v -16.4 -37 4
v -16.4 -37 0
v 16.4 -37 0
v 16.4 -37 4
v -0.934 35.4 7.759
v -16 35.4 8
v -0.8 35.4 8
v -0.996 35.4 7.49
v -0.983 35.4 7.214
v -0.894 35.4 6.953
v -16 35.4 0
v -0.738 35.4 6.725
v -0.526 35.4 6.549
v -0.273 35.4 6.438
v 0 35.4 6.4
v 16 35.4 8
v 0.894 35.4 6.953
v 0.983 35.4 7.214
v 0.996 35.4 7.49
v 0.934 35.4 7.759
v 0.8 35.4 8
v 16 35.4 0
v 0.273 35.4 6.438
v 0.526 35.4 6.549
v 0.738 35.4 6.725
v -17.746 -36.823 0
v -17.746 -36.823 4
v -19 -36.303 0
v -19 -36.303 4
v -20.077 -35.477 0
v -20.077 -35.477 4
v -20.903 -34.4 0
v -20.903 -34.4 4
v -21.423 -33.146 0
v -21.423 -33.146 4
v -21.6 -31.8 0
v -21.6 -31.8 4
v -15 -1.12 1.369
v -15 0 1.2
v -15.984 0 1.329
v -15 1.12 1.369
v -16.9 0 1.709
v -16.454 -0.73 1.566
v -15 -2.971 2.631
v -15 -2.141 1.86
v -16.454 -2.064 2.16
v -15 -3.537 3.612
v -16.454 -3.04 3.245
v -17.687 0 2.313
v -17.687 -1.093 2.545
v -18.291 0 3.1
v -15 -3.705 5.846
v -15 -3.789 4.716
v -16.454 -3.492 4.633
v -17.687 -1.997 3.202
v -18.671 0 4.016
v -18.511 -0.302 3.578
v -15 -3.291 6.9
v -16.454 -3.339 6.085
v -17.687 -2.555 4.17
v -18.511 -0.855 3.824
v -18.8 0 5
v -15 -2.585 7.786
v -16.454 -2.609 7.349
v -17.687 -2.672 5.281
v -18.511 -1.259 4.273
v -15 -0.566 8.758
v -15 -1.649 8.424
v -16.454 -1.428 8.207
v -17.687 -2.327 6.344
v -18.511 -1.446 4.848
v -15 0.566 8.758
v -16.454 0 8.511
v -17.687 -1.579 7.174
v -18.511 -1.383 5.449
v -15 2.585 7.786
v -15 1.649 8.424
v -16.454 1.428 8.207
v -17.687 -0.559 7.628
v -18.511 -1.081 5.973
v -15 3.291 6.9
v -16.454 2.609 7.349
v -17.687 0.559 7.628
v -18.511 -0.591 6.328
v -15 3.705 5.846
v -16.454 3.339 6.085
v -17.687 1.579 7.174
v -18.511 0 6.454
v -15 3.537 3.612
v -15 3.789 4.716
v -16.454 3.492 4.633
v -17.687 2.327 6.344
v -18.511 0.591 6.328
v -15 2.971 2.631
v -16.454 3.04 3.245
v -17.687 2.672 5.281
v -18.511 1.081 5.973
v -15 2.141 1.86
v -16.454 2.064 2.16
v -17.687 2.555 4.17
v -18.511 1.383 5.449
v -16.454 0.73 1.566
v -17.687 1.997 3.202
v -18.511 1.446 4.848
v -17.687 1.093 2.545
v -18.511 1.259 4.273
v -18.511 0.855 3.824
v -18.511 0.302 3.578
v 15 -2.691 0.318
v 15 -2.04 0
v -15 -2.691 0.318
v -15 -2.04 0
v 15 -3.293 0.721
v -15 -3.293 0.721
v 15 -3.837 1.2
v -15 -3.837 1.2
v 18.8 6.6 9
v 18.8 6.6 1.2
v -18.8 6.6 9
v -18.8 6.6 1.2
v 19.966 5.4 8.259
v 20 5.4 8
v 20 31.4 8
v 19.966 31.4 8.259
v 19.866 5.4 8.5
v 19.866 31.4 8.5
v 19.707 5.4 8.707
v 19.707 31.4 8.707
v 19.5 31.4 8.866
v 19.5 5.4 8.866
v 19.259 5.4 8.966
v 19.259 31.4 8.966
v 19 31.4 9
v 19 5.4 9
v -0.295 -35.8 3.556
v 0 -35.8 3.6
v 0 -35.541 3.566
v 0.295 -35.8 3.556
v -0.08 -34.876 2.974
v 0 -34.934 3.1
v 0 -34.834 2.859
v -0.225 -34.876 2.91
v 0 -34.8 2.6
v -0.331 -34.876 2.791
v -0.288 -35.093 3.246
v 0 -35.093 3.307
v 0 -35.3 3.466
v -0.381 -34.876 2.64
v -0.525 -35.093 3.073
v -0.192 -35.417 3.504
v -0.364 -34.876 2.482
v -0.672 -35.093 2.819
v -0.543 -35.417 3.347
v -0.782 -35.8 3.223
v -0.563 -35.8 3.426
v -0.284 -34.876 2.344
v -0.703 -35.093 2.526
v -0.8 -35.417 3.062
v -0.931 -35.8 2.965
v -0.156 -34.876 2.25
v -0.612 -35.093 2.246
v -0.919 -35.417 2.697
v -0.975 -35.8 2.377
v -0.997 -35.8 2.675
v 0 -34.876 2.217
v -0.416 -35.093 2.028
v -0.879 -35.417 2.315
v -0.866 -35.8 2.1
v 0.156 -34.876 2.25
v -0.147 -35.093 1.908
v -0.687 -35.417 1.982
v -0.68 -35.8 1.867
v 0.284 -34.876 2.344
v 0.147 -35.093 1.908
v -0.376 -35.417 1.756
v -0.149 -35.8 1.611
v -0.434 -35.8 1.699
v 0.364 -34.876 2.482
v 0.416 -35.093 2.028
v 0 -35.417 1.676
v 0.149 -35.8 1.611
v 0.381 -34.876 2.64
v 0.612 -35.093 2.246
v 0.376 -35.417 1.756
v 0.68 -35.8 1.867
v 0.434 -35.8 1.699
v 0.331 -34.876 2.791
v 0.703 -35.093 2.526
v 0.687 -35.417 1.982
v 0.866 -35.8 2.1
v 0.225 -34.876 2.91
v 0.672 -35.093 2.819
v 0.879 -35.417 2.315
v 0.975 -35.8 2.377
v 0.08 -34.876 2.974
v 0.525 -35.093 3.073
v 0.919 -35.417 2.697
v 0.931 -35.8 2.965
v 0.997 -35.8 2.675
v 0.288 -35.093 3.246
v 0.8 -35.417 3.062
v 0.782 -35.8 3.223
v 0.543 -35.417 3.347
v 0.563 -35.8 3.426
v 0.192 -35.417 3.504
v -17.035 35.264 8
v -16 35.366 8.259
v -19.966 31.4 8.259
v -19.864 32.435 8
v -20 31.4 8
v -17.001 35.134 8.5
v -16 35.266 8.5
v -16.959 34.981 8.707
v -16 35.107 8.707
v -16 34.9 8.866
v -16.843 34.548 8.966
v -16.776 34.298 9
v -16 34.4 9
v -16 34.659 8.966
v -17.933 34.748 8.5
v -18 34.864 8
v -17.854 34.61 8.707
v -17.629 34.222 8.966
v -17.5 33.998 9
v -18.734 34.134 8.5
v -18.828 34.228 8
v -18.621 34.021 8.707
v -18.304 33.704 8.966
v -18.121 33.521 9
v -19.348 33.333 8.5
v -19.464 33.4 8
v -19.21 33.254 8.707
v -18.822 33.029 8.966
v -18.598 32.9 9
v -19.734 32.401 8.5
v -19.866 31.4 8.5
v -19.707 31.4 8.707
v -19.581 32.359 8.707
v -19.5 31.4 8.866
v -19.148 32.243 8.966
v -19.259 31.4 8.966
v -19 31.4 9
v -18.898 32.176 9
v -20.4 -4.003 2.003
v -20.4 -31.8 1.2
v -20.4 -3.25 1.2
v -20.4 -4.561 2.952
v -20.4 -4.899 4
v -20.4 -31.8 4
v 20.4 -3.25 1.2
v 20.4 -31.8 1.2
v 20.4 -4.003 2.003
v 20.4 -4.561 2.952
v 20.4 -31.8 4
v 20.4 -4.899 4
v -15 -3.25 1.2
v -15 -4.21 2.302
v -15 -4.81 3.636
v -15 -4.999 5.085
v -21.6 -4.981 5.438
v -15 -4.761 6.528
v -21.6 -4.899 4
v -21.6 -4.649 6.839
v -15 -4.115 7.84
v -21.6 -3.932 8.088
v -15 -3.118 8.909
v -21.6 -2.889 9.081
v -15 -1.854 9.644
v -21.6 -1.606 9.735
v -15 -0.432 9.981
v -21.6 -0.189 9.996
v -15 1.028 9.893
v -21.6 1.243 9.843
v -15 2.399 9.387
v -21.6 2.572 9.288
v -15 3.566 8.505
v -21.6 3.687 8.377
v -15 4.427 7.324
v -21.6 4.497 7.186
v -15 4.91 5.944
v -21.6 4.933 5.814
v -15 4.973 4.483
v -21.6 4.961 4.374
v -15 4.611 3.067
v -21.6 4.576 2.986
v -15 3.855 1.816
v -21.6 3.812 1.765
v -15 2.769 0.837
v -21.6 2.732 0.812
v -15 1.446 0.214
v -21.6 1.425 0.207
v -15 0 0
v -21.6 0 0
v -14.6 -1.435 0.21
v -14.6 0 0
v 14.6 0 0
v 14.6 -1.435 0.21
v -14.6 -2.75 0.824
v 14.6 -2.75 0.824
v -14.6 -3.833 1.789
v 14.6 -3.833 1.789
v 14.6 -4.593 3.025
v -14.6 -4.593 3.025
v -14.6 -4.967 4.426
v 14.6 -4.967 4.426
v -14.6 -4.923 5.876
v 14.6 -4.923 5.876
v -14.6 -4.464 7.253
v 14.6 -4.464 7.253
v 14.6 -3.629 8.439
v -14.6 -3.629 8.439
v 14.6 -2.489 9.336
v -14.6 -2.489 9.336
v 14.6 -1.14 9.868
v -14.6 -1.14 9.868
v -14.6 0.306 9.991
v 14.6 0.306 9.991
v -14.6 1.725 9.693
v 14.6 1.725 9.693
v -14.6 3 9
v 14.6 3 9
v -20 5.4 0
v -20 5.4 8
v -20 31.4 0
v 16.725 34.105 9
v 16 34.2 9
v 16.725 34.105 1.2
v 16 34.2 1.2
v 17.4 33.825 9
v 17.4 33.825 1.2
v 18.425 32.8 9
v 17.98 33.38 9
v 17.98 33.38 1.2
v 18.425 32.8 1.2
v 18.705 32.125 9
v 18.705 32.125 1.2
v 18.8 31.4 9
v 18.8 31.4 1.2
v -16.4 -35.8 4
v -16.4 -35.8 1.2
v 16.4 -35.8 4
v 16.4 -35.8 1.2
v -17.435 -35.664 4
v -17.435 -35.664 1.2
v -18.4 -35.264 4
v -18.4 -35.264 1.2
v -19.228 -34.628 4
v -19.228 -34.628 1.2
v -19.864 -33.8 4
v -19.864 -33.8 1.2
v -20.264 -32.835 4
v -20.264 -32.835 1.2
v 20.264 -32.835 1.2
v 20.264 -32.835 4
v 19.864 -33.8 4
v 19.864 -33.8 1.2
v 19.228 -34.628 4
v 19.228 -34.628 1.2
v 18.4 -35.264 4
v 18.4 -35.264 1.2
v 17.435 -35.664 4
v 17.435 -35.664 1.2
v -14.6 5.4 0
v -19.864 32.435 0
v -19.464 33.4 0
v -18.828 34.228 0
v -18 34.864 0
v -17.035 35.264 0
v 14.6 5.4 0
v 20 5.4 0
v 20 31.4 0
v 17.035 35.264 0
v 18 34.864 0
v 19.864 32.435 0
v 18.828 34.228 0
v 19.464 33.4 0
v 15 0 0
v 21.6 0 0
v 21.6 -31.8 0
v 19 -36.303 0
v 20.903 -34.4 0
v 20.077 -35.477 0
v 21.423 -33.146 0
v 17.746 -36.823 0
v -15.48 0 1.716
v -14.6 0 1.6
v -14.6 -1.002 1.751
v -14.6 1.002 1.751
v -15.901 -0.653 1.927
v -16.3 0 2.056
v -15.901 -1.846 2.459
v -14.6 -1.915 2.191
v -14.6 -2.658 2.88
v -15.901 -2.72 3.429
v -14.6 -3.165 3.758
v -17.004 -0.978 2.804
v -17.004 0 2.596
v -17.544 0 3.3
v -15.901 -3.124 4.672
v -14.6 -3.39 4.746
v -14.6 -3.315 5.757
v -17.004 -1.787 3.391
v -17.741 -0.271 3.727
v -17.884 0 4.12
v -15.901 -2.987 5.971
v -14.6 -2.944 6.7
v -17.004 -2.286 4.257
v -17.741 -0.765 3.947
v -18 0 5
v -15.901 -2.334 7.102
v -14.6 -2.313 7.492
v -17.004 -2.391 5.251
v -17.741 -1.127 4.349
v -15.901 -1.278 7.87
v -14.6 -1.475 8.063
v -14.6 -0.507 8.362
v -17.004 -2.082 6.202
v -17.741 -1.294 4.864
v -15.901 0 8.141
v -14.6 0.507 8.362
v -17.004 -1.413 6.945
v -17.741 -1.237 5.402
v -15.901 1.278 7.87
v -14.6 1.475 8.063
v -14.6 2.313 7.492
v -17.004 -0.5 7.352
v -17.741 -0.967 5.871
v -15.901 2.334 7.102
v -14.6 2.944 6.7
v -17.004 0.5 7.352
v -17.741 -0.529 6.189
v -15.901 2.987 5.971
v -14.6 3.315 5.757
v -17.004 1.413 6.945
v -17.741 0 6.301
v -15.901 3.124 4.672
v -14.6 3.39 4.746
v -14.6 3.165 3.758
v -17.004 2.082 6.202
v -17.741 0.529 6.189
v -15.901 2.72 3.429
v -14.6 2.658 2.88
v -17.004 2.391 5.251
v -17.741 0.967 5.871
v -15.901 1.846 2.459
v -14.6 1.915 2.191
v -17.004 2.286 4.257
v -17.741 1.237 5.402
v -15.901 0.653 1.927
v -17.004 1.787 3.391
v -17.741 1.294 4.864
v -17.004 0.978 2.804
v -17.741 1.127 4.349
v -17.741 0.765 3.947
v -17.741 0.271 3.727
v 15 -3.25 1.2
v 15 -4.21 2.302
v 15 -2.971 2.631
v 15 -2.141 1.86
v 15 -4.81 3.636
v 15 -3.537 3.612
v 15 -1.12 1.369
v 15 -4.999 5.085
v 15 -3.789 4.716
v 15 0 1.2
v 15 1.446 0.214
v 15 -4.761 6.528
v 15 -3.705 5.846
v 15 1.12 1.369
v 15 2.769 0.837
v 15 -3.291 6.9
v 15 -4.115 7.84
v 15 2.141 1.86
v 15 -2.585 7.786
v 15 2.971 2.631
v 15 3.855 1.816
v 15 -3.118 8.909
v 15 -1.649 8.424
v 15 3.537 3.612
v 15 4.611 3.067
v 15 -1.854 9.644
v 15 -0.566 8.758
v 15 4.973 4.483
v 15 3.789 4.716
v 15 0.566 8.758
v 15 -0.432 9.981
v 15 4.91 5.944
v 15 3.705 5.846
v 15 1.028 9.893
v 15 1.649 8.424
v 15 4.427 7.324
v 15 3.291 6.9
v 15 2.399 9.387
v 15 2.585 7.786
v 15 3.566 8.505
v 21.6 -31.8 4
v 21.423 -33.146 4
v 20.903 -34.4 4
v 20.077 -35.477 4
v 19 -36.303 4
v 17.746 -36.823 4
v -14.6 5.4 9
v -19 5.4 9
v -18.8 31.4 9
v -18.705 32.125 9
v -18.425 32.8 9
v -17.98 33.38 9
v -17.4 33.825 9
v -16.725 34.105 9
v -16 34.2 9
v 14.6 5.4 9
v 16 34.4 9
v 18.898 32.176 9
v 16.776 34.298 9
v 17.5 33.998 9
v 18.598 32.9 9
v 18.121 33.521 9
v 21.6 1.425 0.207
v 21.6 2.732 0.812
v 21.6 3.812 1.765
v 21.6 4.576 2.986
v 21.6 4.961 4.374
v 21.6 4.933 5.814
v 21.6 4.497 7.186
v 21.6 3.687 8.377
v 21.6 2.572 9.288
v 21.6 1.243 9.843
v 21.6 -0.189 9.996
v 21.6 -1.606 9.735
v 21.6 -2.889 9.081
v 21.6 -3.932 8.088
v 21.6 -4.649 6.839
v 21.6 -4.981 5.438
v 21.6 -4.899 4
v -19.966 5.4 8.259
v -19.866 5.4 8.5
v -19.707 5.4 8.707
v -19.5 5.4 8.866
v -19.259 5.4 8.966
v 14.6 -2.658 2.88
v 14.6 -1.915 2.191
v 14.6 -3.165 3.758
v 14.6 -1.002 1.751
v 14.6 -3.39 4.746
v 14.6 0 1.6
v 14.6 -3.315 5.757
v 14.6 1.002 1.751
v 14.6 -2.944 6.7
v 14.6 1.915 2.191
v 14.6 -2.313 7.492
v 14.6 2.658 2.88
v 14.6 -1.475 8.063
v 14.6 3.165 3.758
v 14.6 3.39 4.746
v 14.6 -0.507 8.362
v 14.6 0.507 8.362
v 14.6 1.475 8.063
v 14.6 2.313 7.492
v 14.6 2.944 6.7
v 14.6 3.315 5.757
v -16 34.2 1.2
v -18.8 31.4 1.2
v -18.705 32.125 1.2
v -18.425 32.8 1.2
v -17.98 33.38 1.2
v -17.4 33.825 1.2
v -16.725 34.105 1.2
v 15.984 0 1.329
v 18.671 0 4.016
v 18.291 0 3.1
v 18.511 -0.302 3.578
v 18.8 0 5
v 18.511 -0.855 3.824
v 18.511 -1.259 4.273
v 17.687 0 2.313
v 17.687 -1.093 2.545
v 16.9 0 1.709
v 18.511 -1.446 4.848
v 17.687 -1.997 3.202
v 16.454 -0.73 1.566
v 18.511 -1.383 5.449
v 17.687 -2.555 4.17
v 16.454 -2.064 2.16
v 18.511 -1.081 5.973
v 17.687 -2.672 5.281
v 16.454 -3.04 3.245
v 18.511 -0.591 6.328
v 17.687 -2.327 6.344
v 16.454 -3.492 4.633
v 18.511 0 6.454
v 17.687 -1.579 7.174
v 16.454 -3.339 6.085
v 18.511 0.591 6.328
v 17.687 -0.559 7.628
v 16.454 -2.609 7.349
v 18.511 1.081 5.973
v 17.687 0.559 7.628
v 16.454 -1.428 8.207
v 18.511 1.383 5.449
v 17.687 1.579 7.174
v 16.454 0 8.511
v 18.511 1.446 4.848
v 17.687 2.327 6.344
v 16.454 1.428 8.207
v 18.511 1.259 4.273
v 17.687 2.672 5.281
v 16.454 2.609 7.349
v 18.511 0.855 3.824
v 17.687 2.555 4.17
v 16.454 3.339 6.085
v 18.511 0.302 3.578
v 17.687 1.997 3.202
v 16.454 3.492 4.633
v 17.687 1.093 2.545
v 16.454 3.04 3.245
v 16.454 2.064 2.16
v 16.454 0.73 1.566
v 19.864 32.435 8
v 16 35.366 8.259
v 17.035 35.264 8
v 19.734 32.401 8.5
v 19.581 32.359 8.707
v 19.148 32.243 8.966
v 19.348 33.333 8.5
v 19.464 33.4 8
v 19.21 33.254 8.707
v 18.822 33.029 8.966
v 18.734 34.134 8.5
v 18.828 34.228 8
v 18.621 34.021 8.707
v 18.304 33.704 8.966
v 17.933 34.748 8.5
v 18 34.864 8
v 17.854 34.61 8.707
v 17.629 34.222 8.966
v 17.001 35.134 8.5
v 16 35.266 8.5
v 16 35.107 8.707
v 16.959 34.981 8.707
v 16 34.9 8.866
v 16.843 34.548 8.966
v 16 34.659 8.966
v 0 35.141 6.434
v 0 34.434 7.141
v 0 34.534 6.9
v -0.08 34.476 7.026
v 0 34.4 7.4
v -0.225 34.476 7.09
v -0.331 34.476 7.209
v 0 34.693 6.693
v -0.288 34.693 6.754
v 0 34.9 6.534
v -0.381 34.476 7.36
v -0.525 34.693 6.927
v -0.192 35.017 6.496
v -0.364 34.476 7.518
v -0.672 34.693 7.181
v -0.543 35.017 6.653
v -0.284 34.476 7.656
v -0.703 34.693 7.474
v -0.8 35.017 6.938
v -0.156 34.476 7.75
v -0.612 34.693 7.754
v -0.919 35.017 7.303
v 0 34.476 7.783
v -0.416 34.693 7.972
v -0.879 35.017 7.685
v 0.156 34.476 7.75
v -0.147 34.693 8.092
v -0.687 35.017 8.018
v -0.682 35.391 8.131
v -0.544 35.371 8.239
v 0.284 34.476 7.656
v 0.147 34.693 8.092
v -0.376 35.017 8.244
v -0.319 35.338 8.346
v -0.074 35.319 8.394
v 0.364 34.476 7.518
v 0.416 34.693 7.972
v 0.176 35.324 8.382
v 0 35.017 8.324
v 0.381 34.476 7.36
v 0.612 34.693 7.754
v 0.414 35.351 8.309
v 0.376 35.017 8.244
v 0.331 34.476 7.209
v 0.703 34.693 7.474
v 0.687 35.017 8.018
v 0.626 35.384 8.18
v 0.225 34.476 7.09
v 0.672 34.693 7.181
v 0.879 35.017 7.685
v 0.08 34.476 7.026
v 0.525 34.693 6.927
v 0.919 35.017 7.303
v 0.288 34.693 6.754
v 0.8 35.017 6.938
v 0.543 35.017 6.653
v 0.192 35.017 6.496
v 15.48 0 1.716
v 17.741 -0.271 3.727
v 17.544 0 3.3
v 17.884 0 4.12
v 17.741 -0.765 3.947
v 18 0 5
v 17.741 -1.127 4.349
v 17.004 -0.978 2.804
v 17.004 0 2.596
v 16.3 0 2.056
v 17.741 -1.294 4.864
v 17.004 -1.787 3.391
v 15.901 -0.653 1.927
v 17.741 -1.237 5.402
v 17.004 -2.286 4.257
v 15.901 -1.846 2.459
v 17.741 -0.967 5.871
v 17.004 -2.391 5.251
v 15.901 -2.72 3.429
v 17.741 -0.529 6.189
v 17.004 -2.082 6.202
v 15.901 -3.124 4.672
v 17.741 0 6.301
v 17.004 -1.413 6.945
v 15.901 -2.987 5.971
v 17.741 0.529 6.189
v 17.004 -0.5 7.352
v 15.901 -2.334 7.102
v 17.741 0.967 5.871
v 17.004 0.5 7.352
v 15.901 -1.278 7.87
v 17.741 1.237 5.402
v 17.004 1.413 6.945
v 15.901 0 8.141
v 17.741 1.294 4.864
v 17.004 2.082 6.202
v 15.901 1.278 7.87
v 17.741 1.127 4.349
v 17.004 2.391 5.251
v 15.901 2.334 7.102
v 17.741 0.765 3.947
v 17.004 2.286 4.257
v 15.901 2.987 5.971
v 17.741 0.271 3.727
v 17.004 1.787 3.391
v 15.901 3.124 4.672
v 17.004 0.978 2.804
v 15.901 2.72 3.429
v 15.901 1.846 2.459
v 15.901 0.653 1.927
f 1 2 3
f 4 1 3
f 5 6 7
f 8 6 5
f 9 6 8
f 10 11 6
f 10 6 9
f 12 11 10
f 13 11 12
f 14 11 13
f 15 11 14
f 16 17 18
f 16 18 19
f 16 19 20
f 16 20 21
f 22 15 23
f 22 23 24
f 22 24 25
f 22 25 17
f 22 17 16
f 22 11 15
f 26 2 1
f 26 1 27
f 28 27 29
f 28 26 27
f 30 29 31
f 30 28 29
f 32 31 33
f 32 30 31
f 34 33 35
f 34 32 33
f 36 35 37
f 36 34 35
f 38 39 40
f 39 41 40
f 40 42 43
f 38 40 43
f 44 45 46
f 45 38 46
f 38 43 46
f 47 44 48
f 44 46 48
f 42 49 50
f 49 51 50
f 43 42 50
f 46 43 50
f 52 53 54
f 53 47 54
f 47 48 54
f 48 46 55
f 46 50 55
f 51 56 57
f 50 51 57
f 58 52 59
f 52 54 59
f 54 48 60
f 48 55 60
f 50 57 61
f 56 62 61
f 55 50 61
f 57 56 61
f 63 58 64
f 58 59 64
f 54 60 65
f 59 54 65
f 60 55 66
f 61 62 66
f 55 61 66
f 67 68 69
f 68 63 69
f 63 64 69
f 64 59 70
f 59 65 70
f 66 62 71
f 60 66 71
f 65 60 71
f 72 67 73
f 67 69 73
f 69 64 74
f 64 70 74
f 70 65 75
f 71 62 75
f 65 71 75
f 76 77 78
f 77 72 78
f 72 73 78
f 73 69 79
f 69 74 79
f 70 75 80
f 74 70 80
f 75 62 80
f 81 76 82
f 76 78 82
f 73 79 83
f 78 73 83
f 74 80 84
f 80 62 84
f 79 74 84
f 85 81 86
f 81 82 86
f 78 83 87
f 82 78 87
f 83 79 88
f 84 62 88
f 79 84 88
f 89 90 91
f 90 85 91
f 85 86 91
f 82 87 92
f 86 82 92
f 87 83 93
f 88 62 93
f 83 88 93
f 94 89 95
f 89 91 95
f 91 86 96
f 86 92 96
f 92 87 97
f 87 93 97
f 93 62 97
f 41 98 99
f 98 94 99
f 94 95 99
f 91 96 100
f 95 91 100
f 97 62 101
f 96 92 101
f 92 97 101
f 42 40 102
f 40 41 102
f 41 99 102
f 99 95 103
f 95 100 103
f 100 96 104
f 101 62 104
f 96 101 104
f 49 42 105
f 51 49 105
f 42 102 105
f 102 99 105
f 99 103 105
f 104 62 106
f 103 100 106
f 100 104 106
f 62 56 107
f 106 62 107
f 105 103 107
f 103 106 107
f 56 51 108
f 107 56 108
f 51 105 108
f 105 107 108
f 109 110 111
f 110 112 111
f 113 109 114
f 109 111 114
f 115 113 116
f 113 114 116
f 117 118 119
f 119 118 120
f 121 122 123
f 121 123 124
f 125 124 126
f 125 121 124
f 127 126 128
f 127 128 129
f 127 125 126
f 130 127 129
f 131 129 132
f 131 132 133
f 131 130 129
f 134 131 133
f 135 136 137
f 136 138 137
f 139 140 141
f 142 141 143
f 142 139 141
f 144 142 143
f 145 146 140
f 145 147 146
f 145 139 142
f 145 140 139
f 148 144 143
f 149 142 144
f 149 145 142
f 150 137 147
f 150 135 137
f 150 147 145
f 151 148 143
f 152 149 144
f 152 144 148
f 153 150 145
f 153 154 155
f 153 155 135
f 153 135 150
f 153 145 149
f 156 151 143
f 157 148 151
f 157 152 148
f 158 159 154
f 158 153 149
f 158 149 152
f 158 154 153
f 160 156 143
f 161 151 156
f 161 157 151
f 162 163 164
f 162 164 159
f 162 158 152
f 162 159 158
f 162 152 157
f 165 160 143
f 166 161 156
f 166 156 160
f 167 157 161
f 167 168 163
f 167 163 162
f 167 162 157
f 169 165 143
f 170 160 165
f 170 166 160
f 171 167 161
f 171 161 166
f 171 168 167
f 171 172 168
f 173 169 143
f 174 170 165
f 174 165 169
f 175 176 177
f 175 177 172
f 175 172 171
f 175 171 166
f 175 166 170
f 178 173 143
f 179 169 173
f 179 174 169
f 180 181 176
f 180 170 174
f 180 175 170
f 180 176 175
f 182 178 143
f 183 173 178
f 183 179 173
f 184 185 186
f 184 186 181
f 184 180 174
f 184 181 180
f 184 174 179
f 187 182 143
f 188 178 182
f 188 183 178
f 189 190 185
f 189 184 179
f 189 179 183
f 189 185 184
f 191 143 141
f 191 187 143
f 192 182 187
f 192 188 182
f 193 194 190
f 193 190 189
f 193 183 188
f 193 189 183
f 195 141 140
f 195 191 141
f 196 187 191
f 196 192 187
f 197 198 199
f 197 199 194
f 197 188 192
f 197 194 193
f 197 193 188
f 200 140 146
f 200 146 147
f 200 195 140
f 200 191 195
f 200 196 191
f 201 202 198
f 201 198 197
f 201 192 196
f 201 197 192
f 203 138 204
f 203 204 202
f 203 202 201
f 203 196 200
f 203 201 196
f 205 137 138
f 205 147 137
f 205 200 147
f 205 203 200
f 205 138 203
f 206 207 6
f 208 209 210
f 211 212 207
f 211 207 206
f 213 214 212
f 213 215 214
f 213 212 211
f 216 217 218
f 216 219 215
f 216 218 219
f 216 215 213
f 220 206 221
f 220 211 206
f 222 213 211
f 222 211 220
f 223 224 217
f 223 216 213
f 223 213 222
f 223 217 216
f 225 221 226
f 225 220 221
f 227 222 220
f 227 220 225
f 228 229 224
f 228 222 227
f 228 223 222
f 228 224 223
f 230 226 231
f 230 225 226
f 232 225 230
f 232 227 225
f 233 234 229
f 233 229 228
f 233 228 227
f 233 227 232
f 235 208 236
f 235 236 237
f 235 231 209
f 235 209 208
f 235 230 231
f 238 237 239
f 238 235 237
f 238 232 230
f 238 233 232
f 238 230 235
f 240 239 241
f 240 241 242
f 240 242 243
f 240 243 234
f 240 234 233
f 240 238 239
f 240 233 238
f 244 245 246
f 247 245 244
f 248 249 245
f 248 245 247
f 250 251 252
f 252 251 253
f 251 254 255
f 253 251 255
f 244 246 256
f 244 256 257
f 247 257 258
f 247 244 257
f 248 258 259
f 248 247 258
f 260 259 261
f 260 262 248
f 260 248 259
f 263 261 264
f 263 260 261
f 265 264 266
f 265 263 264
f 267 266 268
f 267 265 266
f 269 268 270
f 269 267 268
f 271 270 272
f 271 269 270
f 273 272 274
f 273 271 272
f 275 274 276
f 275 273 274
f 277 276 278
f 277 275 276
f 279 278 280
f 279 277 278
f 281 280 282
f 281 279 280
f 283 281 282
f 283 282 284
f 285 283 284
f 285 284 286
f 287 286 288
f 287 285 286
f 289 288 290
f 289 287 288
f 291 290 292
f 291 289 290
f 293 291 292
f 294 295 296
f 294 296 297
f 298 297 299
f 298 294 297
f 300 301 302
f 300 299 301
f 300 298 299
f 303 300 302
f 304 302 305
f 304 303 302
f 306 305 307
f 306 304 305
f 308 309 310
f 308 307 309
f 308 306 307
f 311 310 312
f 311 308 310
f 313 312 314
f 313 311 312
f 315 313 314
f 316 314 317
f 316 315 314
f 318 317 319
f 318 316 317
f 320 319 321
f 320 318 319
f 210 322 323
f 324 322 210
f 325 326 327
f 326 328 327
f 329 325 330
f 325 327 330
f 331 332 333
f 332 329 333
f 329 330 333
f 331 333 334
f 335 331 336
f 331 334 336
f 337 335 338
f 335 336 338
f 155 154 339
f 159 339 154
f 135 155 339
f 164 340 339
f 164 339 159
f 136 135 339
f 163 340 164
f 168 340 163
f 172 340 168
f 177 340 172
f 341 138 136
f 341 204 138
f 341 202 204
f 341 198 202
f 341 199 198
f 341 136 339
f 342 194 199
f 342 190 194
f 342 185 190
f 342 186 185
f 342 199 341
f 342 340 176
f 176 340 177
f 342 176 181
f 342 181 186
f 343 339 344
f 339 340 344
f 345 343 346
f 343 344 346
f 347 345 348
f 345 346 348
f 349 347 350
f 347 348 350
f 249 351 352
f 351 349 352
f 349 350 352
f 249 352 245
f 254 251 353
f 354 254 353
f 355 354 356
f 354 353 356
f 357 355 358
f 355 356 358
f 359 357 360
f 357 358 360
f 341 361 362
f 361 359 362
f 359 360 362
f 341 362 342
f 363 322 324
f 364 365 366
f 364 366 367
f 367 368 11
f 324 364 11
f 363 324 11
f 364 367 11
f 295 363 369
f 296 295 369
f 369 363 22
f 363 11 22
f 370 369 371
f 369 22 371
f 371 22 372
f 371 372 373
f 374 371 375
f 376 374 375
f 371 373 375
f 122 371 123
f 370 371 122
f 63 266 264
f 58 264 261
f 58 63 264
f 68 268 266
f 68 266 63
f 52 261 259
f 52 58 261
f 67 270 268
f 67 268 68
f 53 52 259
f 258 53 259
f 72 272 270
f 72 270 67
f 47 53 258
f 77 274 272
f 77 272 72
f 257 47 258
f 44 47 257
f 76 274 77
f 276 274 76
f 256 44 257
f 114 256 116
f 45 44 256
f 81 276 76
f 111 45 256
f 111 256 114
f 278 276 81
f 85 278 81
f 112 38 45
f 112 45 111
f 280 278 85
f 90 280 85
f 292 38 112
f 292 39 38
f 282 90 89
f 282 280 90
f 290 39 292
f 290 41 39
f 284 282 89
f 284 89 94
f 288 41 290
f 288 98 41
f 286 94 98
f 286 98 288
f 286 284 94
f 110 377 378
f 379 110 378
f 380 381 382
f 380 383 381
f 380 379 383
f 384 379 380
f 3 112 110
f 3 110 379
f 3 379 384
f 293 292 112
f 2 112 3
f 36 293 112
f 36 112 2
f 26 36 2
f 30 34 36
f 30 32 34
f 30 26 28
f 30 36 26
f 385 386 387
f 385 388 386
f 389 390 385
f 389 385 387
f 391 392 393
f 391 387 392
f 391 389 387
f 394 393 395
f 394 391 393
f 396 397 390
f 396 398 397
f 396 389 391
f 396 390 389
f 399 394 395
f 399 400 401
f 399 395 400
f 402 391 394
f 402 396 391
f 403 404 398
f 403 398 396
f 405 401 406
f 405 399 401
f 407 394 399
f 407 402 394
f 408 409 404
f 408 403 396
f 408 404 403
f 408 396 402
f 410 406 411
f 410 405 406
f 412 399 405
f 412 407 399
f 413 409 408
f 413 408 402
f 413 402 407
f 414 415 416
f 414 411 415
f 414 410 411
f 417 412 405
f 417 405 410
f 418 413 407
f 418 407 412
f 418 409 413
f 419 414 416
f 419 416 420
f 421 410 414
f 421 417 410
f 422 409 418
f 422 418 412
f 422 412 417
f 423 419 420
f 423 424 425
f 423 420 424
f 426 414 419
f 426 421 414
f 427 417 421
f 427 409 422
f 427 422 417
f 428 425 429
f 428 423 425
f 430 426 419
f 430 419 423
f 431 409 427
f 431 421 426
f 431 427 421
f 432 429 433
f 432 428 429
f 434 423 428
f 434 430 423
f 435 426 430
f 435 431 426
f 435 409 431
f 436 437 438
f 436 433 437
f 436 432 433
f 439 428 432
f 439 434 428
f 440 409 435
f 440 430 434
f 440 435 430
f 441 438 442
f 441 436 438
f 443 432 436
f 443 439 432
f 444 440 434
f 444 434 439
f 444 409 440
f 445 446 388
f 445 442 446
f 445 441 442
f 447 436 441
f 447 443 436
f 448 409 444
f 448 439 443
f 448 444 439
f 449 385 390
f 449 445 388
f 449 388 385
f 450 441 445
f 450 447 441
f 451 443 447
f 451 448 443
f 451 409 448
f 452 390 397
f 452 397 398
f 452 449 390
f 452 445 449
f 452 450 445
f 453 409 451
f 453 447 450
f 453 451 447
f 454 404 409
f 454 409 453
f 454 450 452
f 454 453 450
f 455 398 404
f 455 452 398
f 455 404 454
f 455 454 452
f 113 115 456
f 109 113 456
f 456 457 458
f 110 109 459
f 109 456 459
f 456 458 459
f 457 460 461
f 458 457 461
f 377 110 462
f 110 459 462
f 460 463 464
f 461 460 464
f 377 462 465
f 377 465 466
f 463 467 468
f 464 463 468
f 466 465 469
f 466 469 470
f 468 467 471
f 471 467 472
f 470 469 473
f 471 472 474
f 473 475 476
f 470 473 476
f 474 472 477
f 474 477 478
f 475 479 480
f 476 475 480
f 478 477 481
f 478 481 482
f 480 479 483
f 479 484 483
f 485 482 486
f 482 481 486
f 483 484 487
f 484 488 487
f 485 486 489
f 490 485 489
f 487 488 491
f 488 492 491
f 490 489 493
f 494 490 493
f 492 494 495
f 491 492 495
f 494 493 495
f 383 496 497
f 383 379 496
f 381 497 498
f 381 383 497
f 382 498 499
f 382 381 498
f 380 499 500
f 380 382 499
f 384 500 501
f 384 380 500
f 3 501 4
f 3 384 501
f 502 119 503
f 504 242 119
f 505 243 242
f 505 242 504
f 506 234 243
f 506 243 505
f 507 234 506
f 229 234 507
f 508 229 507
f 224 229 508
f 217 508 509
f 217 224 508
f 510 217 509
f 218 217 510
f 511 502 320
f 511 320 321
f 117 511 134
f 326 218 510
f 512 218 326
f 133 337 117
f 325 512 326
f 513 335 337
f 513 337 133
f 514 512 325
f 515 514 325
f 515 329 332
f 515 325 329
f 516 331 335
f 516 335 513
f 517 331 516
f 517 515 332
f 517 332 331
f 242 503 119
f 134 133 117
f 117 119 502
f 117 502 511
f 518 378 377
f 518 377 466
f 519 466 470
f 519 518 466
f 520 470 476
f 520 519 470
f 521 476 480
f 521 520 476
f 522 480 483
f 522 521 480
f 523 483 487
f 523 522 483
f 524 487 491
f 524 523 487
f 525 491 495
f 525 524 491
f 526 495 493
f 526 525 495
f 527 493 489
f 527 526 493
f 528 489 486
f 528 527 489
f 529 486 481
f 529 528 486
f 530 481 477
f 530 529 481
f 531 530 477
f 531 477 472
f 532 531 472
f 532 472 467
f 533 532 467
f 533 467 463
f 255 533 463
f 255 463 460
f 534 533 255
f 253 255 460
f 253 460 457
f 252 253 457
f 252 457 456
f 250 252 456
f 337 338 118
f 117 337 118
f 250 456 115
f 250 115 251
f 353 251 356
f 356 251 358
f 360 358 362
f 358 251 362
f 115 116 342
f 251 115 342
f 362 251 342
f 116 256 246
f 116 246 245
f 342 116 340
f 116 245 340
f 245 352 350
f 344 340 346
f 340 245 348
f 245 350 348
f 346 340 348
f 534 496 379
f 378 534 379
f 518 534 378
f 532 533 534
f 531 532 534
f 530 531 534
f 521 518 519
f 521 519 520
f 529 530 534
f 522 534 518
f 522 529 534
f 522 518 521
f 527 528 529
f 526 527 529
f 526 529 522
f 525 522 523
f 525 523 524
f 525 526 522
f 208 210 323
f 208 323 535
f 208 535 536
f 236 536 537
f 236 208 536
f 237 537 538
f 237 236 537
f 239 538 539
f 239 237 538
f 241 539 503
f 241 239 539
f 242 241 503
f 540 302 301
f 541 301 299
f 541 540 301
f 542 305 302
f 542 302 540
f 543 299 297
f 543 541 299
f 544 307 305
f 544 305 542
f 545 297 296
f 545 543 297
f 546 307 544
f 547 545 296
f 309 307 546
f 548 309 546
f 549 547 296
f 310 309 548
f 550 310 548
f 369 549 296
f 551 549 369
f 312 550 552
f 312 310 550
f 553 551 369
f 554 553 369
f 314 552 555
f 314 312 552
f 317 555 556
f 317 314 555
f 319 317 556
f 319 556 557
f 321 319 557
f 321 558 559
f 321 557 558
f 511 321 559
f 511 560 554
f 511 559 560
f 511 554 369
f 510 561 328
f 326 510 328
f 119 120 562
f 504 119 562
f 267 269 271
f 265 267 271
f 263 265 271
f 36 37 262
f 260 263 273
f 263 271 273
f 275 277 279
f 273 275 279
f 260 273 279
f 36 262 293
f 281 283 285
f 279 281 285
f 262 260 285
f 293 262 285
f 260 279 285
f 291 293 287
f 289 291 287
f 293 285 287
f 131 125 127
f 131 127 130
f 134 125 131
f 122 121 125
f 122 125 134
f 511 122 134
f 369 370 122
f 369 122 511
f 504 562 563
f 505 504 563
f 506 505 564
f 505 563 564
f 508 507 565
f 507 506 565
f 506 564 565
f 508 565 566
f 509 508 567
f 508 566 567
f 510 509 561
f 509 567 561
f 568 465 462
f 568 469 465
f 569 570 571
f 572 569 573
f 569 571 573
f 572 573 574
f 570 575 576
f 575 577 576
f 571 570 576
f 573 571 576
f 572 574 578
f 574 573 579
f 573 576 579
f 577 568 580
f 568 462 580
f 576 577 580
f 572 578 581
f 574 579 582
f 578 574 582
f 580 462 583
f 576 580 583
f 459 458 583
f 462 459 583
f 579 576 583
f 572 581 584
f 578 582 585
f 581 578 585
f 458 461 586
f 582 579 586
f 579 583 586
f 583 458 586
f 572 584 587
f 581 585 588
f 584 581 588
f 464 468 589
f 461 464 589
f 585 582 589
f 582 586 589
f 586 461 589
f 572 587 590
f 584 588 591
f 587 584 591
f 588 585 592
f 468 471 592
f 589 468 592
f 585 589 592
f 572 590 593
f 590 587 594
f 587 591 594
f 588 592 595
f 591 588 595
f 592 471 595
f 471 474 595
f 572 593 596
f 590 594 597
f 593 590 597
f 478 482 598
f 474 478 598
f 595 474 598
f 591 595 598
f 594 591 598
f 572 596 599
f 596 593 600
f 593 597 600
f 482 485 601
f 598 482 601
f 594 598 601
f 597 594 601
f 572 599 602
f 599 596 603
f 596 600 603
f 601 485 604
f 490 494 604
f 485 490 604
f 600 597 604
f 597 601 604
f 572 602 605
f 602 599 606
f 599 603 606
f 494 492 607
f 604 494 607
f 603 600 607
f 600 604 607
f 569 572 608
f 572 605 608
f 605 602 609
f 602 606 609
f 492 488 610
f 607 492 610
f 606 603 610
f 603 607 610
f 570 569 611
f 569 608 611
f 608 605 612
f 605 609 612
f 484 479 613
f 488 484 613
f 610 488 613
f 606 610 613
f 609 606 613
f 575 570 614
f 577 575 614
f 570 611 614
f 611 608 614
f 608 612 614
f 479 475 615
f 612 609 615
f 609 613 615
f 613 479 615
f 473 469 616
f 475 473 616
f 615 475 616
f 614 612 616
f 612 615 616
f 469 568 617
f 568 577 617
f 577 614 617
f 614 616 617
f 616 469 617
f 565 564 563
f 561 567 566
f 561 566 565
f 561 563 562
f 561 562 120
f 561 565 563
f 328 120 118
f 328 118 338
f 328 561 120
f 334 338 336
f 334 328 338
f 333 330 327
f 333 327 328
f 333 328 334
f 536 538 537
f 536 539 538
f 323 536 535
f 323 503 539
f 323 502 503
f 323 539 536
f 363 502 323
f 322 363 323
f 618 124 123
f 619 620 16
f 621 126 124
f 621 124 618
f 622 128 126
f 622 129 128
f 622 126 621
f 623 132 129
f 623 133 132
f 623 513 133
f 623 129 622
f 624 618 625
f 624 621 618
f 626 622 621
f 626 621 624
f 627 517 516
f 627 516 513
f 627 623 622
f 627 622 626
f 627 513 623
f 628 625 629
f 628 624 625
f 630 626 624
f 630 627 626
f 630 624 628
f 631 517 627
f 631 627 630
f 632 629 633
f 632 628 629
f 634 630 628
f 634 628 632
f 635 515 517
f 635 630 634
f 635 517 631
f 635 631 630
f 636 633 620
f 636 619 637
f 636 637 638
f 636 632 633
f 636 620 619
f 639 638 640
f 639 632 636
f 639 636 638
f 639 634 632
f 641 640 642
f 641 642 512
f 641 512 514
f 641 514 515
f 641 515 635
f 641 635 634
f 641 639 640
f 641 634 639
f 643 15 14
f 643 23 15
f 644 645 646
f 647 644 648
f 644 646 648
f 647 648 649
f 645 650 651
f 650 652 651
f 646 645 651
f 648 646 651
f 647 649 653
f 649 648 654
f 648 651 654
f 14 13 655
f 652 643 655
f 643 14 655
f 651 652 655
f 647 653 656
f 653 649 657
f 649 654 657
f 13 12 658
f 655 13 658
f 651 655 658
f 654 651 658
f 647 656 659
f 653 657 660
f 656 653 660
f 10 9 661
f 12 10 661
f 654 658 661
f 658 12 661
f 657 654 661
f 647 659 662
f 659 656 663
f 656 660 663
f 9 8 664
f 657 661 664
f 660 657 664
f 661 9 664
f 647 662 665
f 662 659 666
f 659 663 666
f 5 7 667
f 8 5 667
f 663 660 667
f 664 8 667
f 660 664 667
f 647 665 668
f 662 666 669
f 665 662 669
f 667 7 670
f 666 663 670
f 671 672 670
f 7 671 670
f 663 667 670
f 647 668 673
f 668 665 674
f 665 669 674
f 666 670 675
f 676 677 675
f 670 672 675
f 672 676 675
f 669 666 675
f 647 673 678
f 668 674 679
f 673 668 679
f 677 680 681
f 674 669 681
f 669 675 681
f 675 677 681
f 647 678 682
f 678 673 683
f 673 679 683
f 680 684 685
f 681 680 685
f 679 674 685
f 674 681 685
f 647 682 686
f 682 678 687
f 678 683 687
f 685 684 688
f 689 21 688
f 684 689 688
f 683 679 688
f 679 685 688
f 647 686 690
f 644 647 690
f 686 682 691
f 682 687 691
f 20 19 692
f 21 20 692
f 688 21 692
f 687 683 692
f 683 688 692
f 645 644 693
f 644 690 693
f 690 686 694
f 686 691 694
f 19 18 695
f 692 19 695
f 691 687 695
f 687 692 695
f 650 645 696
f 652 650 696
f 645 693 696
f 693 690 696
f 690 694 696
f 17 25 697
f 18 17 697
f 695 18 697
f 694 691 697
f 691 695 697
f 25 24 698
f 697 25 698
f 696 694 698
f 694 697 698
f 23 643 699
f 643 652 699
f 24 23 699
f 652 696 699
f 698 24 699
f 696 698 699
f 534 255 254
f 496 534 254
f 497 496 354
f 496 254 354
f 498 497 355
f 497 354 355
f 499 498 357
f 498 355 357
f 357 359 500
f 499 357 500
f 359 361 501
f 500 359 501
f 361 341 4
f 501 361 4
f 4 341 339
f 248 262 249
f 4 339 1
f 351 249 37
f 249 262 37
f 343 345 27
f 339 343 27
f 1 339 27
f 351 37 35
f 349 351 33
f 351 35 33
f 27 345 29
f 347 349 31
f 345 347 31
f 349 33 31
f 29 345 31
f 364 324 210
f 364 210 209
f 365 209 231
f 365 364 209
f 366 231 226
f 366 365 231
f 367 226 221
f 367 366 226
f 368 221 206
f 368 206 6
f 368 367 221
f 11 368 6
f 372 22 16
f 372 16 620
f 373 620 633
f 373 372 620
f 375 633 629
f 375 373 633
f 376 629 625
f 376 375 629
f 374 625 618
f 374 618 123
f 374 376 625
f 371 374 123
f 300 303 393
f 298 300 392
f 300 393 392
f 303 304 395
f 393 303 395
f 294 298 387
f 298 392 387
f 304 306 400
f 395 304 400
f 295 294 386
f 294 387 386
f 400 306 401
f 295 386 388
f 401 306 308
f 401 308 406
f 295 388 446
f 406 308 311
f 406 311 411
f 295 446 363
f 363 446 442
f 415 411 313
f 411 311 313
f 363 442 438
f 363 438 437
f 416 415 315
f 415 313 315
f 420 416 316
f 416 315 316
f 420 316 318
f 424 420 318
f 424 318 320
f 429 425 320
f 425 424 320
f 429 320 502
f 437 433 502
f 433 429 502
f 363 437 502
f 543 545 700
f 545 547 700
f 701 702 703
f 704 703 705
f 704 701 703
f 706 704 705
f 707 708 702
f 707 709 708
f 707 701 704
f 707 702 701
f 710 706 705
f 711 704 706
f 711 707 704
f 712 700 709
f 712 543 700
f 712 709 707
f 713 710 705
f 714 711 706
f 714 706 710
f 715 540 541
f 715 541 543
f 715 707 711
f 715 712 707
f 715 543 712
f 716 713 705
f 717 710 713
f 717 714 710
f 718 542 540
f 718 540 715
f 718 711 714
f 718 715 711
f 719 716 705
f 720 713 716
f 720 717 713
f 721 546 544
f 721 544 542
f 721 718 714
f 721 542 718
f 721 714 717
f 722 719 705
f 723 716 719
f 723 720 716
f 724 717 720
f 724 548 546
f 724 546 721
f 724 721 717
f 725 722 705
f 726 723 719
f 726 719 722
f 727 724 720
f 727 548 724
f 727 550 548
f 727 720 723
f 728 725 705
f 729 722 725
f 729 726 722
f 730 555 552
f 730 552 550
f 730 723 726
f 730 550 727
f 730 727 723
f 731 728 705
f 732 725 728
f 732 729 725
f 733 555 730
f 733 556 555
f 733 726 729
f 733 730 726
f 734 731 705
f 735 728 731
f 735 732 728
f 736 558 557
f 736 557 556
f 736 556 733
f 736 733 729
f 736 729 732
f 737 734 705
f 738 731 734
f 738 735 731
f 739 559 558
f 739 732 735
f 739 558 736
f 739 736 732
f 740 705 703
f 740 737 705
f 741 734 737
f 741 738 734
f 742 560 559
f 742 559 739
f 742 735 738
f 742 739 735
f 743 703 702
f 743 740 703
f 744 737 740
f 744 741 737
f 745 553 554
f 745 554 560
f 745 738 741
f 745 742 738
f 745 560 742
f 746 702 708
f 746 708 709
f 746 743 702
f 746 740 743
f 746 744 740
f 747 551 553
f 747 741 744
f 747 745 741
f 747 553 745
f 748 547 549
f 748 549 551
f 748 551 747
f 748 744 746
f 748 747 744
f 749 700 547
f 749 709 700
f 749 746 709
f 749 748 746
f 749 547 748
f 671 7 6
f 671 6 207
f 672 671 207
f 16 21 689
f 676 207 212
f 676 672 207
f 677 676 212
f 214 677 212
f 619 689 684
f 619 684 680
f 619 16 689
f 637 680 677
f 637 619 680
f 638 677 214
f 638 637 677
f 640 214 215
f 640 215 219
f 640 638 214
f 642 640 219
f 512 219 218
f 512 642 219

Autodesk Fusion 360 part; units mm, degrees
sketch "Body" plane through (0, 0, 0) normal (0, 0, 1) x (1, 0, 0) in component "Base"
  line L0 (0, 0) -> (0, 5.4)
  line L1 (0, 5.4) -> (-20, 5.4)
  line L2 (-20, 5.4) -> (-20, 31.4)
  line L3 (-16, 35.4) -> (16, 35.4)
  line L4 (20, 31.4) -> (20, 5.4)
  line L5 (20, 5.4) -> (0, 5.4)
  arc A0 (-16, 35.4) -> (-20, 31.4) centre (-16, 31.4) ccw
  arc A1 (20, 31.4) -> (16, 35.4) centre (16, 31.4) ccw
  line L6 (0, 6.6) -> (-18.8, 6.6)
  line L7 (-18.8, 6.6) -> (-18.8, 31.4)
  arc A2 (-16, 34.2) -> (-18.8, 31.4) centre (-16, 31.4) ccw
  line L8 (-16, 34.2) -> (16, 34.2)
  arc A3 (18.8, 31.4) -> (16, 34.2) centre (16, 31.4) ccw
  line L9 (18.8, 31.4) -> (18.8, 6.6)
  line L10 (18.8, 6.6) -> (0, 6.6)
  dimension "d7" = 5.4
  dimension "d8" = 20
  dimension "d9" = 30
  dimension "d10" = 40
  dimension "d11" = 30
  dimension "d12" = 20
  dimension "d13" = 4
  dimension "d14" = 1.2
extrude "Extrude1" add sketch "Body" along normal blind 1.2 contours L6 L7 A2 L8 A3 L9 L10 makes body 1 in component "Base"
extrude "Extrude2" add sketch "Body" along normal blind 9 bodies 1 in component "Base"
sketch "Hinge" plane through (0, 0, 0) normal (1, 0, 0) x (0, 1, 0) in component "Base"
  line L0 (0, 0) -> (5.4, 0)
  line L1 (0, 0) -> (0, 5)
  circle A0 centre (0, 5) radius 5
  line L2 (0, 9) -> (5.4, 9)
  line L3 (5.4, 9) -> (5.4, 0)
  dimension "d19" = 5
  dimension "d20" = 10
  dimension "d21" = 9
extrude "Extrude3" add sketch "Hinge" along normal mid plane 29.2 bodies 1 in component "Base"
sketch "Hinge Ball" plane through (0, 0, 0) normal (0, 1, 0) x (1, 0, 0) in component "Base"
  line L0 (0, 0) -> (-18.8, 0)
  line L1 (0, 0) -> (0, -5) construction
  line L2 (0, -5) -> (14.6, -5) construction
  line L3 (14.6, -5) -> (18, -5)
  line L4 (14.6, -5) -> (14.6, -1.6)
  line L5 (18, -5) -> (18, -10.5) construction
  line L6 (14.6, -1.6) -> (9.5, -1.6) construction
  arc A0 (18, -5) -> (14.6, -1.6) centre (14.6, -5) ccw
  line L7 (-14.6, -5) -> (-18, -5)
  arc A1 (-14.6, -1.6) -> (-18, -5) centre (-14.6, -5) ccw
  line L8 (-14.6, -5) -> (-14.6, -1.6)
  dimension "d24" = 5
  dimension "d25" = 14.6
  dimension "d26" = 3.4
  dimension "d27" = 3.4
revolve "Revolve1" add sketch "Hinge Ball" angle 360 about axis through (0, 0, 5) along (1, 0, 0) bodies 1 in component "Base"
sketch "Body (2)" plane through (0, 0, 0) normal (0, 0, 1) x (1, 0, 0) in component "Lid"
  line L0 (0, 0) -> (0, 5.4)
  line L1 (0, 0) -> (0, -5)
  line L2 (0, -5) -> (-20.4, -5)
  line L3 (-20.4, -5) -> (-20.4, -31.8)
  line L4 (-16.4, -35.8) -> (16.4, -35.8)
  line L5 (20.4, -31.8) -> (20.4, -5)
  line L6 (20.4, -5) -> (0, -5)
  arc A0 (-20.4, -31.8) -> (-16.4, -35.8) centre (-16.4, -31.8) ccw
  arc A1 (16.4, -35.8) -> (20.4, -31.8) centre (16.4, -31.8) ccw
  line L7 (-21.6, -5) -> (-21.6, -31.8)
  arc A2 (-21.6, -31.8) -> (-16.4, -37) centre (-16.4, -31.8) ccw
  line L8 (-16.4, -37) -> (16.4, -37)
  arc A3 (16.4, -37) -> (21.6, -31.8) centre (16.4, -31.8) ccw
  line L9 (21.6, -31.8) -> (21.6, -5)
  line L10 (-21.6, -5) -> (-20.4, -5)
  line L11 (21.6, -5) -> (20.4, -5)
  dimension "d29" = 5
  dimension "d30" = 20.4
  dimension "d31" = 30.8
  dimension "d32" = 40.8
  dimension "d33" = 30.8
  dimension "d34" = 20.4
  dimension "d35" = 4
  dimension "d36" = 1.2
extrude "Extrude1'" add sketch "Body (2)" along normal blind 1.2 separate body contours L2 L3 L4 L5 L6 A0 A1 makes body 2 in component "Lid"
extrude "Extrude2'" add sketch "Body (2)" along normal blind 4 contours L3 L4 L5 A0 A1 L7 A2 L8 A3 L9 L10 L11 bodies 2 in component "Lid"
sketch "Hing Sockets" plane through (0, 0, 0) normal (0, 1, 0) x (1, 0, 0) in component "Lid"
  line L0 (0, 0) -> (0, -5)
  line L1 (21.6, 0) -> (21.6, -5)
  line L2 (0, -5) -> (15, -5) construction
  line L3 (15, -5) -> (18.8, -5)
  line L4 (15, -5) -> (15, -1.2)
  line L5 (18.8, -5) -> (18.8, -10.0001) construction
  line L6 (15, -1.2) -> (11, -1.2) construction
  arc A0 (18.8, -5) -> (15, -1.2) centre (15, -5) ccw
  line L7 (18.8, -5) -> (21.6, -5)
  line L8 (15, 0) -> (18.8, 0)
  line L9 (18.8, 0) -> (21.6, 0)
  line L10 (15, -1.2) -> (15, 0)
  arc A1 (-15, -1.2) -> (-18.8, -5) centre (-15, -5) ccw
  line L11 (-18.8, -5) -> (-21.6, -5)
  line L12 (-21.6, 0) -> (-21.6, -5)
  line L13 (-18.8, 0) -> (-21.6, 0)
  line L14 (-15, 0) -> (-18.8, 0)
  line L15 (-15, -1.2) -> (-15, 0)
  dimension "d41" = 5
  dimension "d42" = 21.6
  dimension "d43" = 15
  dimension "d44" = 3.8
  dimension "d45" = 3.8
  dimension "d46" = 5
revolve "Revolve1'" add sketch "Hing Sockets" angle 360 about axis through (0, 0, 5) along (1, 0, 0) separate body contours L1 A0 L7 L8 L9 L10 | A1 L11 L12 L13 L14 L15 makes body 3 at (-17.2, -0.2492, 0.0062) makes body 4 at (17.2, -0.2492, 0.0062) in component "Lid"
sketch "Body To Hinge Sockets" plane through (0, 0, 0) normal (1, 0, 0) x (0, 1, 0) in component "Lid"
  line L0 (0, 0) -> (5.4, 0)
  line L1 (0, 0) -> (0, 5)
  line L2 (0, 0) -> (-5, 0)
  line L3 (0, 1.2) -> (-5, 1.2)
  line L4 (0, 4) -> (-5, 4)
  line L5 (-5, 4) -> (-5, 0)
  circle A0 centre (0, 5) radius 5
  circle A1 centre (0, 5) radius 5.4
  dimension "d48" = 5
  dimension "d49" = 5
  dimension "d50" = 1.2
  dimension "d51" = 4
  dimension "d52" = 10
  dimension "d53" = 0.4
extrude "Extrude3'" add sketch "Body To Hinge Sockets" along normal mid plane 43.2 contours L2 L3 A0 A1 | L2 L3 L5 A1 | L3 L4 L5 A0 A1 | L3 L5 A1 bodies 2 3 4 in component "Lid"
extrude "Extrude4" cut sketch "Body To Hinge Sockets" along normal mid plane 30 contours L2 L3 A0 A1 | L3 L4 L5 A0 A1 | L3 L5 A1 bodies 2 in component "Lid"
extrude "Extrude5" cut sketch "Body To Hinge Sockets" along normal mid plane 40.8 contours L3 L4 L5 A0 A1 | L3 L5 A1 bodies 2 in component "Lid"
fillet "Fillet1" radius 1 5 edges at (20, 18.4, 9) (18.8284, 34.2284, 9) (0, 35.4, 9) (-18.8284, 34.2284, 9) (-20, 18.4, 9) on bodies 1 in component "Base"
sketch "Latch Socket" plane through (0, 0, 0) normal (1, 0, 0) x (0, 1, 0) in component "Base"
  line L0 (0, 0) -> (5.4, 0)
  line L1 (0, 0) -> (35.4, 0) construction
  line L2 (35.4, 0) -> (35.4, 7.4) construction
  circle A0 centre (35.4, 7.4) radius 1
  line L3 (35.4, 7.4) -> (35.4, 8.4)
  line L4 (35.4, 7.4) -> (34.4, 7.4)
  dimension "d68" = 35.4
  dimension "d69" = 7.4
  dimension "d70" = 2
revolve "Revolve2" cut sketch "Latch Socket" angle 360 about axis through (0, 35.4, 7.4) along (0, -1, 0) contours A0 L3 L4 picked at (34.9478, 6.9127) bodies 1 in component "Base"
sketch "Latch Ball" plane through (0, 0, 0) normal (1, 0, 0) x (0, 1, 0) in component "Lid"
  line L0 (-35.8, 1.2) -> (-35.8, 2.6)
  circle A0 centre (-35.8, 2.6) radius 1
  line L1 (-35.8, 2.56) -> (-35.8, 3.6)
  line L2 (-35.8, 2.6) -> (-34.8, 2.6)
  point P0 (0, 0)
  dimension "d76" = 1.4
  dimension "d77" = 2
revolve "Revolve2'" add sketch "Latch Ball" angle 360 about axis through (0, -35.8, 2.6) along (0, 1, 0) contours A0 L1 L2 bodies 2 in component "Lid"
component "Base" placed x (1, 0, 0) y (0, 1, 0) z (0, 0, 1) at (0, 0, 0)
component "Lid" placed x (1, 0, 0) y (0, 1, 0) z (0, 0, 1) at (0, 0, 0)
equation "Length = 40 mm"
equation "Depth = 30 mm"
equation "Height = 10 mm"
equation "LidLip = 4 mm"
equation "Thickness = 1.2 mm"
equation "Tolerance = 0.4 mm"
equation "d7 = ( Height / 2 ) + Tolerance"
equation "d8 = ( Length / 2 )"
equation "d9 = Depth"
equation "d10 = Length"
equation "d11 = Depth"
equation "d12 = ( Length / 2 )"
equation "d14 = Thickness"
equation "d15 = Thickness"
equation "d17 = ( Height - 1 mm )"
equation "d19 = ( Height / 2 )"
equation "d20 = Height"
equation "d21 = ( Height - 1 mm )"
equation "d22 = ( Length / 2 ) - ( Height / 2 ) - Tolerance"
equation "d24 = ( Height / 2 )"
equation "d25 = ( Length / 2 ) - ( Height / 2 ) - Tolerance"
equation "d26 = ( Height / 2 ) - Thickness - Tolerance"
equation "d27 = ( Height / 2 ) - Thickness - Tolerance"
equation "d29 = ( Height / 2 )"
equation "d30 = ( Length / 2 ) + Tolerance"
equation "d31 = Depth + ( Tolerance * 2 )"
equation "d32 = Length + ( Tolerance * 2 )"
equation "d33 = Depth + ( Tolerance * 2 )"
equation "d34 = ( Length / 2 ) + Tolerance"
equation "d36 = Thickness"
equation "d37 = Thickness"
equation "d39 = LidLip"
equation "d41 = ( Height / 2 )"
equation "d42 = ( Length / 2 ) + Thickness + Tolerance"
equation "d43 = ( Length / 2 ) - ( Height / 2 )"
equation "d44 = ( Height / 2 ) - Thickness"
equation "d45 = ( Height / 2 ) - Thickness"
equation "d46 = ( Height / 2 )"
equation "d48 = ( Height / 2 )"
equation "d49 = ( Height / 2 )"
equation "d50 = Thickness"
equation "d51 = LidLip"
equation "d52 = Height"
equation "d53 = Tolerance"
equation "d54 = ( Length / 2 ) + Thickness + Tolerance"
equation "d56 = ( Length / 2 ) - ( Height / 2 )"
equation "d58 = ( Length / 2 ) + Tolerance"
equation "d68 = ( ( Height / 2 ) + Tolerance ) + Depth"
equation "d69 = ( Height - Thickness ) - ( ( LidLip - Thickness ) / 2 )"
equation "d76 = ( ( LidLip - Thickness ) / 2 )"
